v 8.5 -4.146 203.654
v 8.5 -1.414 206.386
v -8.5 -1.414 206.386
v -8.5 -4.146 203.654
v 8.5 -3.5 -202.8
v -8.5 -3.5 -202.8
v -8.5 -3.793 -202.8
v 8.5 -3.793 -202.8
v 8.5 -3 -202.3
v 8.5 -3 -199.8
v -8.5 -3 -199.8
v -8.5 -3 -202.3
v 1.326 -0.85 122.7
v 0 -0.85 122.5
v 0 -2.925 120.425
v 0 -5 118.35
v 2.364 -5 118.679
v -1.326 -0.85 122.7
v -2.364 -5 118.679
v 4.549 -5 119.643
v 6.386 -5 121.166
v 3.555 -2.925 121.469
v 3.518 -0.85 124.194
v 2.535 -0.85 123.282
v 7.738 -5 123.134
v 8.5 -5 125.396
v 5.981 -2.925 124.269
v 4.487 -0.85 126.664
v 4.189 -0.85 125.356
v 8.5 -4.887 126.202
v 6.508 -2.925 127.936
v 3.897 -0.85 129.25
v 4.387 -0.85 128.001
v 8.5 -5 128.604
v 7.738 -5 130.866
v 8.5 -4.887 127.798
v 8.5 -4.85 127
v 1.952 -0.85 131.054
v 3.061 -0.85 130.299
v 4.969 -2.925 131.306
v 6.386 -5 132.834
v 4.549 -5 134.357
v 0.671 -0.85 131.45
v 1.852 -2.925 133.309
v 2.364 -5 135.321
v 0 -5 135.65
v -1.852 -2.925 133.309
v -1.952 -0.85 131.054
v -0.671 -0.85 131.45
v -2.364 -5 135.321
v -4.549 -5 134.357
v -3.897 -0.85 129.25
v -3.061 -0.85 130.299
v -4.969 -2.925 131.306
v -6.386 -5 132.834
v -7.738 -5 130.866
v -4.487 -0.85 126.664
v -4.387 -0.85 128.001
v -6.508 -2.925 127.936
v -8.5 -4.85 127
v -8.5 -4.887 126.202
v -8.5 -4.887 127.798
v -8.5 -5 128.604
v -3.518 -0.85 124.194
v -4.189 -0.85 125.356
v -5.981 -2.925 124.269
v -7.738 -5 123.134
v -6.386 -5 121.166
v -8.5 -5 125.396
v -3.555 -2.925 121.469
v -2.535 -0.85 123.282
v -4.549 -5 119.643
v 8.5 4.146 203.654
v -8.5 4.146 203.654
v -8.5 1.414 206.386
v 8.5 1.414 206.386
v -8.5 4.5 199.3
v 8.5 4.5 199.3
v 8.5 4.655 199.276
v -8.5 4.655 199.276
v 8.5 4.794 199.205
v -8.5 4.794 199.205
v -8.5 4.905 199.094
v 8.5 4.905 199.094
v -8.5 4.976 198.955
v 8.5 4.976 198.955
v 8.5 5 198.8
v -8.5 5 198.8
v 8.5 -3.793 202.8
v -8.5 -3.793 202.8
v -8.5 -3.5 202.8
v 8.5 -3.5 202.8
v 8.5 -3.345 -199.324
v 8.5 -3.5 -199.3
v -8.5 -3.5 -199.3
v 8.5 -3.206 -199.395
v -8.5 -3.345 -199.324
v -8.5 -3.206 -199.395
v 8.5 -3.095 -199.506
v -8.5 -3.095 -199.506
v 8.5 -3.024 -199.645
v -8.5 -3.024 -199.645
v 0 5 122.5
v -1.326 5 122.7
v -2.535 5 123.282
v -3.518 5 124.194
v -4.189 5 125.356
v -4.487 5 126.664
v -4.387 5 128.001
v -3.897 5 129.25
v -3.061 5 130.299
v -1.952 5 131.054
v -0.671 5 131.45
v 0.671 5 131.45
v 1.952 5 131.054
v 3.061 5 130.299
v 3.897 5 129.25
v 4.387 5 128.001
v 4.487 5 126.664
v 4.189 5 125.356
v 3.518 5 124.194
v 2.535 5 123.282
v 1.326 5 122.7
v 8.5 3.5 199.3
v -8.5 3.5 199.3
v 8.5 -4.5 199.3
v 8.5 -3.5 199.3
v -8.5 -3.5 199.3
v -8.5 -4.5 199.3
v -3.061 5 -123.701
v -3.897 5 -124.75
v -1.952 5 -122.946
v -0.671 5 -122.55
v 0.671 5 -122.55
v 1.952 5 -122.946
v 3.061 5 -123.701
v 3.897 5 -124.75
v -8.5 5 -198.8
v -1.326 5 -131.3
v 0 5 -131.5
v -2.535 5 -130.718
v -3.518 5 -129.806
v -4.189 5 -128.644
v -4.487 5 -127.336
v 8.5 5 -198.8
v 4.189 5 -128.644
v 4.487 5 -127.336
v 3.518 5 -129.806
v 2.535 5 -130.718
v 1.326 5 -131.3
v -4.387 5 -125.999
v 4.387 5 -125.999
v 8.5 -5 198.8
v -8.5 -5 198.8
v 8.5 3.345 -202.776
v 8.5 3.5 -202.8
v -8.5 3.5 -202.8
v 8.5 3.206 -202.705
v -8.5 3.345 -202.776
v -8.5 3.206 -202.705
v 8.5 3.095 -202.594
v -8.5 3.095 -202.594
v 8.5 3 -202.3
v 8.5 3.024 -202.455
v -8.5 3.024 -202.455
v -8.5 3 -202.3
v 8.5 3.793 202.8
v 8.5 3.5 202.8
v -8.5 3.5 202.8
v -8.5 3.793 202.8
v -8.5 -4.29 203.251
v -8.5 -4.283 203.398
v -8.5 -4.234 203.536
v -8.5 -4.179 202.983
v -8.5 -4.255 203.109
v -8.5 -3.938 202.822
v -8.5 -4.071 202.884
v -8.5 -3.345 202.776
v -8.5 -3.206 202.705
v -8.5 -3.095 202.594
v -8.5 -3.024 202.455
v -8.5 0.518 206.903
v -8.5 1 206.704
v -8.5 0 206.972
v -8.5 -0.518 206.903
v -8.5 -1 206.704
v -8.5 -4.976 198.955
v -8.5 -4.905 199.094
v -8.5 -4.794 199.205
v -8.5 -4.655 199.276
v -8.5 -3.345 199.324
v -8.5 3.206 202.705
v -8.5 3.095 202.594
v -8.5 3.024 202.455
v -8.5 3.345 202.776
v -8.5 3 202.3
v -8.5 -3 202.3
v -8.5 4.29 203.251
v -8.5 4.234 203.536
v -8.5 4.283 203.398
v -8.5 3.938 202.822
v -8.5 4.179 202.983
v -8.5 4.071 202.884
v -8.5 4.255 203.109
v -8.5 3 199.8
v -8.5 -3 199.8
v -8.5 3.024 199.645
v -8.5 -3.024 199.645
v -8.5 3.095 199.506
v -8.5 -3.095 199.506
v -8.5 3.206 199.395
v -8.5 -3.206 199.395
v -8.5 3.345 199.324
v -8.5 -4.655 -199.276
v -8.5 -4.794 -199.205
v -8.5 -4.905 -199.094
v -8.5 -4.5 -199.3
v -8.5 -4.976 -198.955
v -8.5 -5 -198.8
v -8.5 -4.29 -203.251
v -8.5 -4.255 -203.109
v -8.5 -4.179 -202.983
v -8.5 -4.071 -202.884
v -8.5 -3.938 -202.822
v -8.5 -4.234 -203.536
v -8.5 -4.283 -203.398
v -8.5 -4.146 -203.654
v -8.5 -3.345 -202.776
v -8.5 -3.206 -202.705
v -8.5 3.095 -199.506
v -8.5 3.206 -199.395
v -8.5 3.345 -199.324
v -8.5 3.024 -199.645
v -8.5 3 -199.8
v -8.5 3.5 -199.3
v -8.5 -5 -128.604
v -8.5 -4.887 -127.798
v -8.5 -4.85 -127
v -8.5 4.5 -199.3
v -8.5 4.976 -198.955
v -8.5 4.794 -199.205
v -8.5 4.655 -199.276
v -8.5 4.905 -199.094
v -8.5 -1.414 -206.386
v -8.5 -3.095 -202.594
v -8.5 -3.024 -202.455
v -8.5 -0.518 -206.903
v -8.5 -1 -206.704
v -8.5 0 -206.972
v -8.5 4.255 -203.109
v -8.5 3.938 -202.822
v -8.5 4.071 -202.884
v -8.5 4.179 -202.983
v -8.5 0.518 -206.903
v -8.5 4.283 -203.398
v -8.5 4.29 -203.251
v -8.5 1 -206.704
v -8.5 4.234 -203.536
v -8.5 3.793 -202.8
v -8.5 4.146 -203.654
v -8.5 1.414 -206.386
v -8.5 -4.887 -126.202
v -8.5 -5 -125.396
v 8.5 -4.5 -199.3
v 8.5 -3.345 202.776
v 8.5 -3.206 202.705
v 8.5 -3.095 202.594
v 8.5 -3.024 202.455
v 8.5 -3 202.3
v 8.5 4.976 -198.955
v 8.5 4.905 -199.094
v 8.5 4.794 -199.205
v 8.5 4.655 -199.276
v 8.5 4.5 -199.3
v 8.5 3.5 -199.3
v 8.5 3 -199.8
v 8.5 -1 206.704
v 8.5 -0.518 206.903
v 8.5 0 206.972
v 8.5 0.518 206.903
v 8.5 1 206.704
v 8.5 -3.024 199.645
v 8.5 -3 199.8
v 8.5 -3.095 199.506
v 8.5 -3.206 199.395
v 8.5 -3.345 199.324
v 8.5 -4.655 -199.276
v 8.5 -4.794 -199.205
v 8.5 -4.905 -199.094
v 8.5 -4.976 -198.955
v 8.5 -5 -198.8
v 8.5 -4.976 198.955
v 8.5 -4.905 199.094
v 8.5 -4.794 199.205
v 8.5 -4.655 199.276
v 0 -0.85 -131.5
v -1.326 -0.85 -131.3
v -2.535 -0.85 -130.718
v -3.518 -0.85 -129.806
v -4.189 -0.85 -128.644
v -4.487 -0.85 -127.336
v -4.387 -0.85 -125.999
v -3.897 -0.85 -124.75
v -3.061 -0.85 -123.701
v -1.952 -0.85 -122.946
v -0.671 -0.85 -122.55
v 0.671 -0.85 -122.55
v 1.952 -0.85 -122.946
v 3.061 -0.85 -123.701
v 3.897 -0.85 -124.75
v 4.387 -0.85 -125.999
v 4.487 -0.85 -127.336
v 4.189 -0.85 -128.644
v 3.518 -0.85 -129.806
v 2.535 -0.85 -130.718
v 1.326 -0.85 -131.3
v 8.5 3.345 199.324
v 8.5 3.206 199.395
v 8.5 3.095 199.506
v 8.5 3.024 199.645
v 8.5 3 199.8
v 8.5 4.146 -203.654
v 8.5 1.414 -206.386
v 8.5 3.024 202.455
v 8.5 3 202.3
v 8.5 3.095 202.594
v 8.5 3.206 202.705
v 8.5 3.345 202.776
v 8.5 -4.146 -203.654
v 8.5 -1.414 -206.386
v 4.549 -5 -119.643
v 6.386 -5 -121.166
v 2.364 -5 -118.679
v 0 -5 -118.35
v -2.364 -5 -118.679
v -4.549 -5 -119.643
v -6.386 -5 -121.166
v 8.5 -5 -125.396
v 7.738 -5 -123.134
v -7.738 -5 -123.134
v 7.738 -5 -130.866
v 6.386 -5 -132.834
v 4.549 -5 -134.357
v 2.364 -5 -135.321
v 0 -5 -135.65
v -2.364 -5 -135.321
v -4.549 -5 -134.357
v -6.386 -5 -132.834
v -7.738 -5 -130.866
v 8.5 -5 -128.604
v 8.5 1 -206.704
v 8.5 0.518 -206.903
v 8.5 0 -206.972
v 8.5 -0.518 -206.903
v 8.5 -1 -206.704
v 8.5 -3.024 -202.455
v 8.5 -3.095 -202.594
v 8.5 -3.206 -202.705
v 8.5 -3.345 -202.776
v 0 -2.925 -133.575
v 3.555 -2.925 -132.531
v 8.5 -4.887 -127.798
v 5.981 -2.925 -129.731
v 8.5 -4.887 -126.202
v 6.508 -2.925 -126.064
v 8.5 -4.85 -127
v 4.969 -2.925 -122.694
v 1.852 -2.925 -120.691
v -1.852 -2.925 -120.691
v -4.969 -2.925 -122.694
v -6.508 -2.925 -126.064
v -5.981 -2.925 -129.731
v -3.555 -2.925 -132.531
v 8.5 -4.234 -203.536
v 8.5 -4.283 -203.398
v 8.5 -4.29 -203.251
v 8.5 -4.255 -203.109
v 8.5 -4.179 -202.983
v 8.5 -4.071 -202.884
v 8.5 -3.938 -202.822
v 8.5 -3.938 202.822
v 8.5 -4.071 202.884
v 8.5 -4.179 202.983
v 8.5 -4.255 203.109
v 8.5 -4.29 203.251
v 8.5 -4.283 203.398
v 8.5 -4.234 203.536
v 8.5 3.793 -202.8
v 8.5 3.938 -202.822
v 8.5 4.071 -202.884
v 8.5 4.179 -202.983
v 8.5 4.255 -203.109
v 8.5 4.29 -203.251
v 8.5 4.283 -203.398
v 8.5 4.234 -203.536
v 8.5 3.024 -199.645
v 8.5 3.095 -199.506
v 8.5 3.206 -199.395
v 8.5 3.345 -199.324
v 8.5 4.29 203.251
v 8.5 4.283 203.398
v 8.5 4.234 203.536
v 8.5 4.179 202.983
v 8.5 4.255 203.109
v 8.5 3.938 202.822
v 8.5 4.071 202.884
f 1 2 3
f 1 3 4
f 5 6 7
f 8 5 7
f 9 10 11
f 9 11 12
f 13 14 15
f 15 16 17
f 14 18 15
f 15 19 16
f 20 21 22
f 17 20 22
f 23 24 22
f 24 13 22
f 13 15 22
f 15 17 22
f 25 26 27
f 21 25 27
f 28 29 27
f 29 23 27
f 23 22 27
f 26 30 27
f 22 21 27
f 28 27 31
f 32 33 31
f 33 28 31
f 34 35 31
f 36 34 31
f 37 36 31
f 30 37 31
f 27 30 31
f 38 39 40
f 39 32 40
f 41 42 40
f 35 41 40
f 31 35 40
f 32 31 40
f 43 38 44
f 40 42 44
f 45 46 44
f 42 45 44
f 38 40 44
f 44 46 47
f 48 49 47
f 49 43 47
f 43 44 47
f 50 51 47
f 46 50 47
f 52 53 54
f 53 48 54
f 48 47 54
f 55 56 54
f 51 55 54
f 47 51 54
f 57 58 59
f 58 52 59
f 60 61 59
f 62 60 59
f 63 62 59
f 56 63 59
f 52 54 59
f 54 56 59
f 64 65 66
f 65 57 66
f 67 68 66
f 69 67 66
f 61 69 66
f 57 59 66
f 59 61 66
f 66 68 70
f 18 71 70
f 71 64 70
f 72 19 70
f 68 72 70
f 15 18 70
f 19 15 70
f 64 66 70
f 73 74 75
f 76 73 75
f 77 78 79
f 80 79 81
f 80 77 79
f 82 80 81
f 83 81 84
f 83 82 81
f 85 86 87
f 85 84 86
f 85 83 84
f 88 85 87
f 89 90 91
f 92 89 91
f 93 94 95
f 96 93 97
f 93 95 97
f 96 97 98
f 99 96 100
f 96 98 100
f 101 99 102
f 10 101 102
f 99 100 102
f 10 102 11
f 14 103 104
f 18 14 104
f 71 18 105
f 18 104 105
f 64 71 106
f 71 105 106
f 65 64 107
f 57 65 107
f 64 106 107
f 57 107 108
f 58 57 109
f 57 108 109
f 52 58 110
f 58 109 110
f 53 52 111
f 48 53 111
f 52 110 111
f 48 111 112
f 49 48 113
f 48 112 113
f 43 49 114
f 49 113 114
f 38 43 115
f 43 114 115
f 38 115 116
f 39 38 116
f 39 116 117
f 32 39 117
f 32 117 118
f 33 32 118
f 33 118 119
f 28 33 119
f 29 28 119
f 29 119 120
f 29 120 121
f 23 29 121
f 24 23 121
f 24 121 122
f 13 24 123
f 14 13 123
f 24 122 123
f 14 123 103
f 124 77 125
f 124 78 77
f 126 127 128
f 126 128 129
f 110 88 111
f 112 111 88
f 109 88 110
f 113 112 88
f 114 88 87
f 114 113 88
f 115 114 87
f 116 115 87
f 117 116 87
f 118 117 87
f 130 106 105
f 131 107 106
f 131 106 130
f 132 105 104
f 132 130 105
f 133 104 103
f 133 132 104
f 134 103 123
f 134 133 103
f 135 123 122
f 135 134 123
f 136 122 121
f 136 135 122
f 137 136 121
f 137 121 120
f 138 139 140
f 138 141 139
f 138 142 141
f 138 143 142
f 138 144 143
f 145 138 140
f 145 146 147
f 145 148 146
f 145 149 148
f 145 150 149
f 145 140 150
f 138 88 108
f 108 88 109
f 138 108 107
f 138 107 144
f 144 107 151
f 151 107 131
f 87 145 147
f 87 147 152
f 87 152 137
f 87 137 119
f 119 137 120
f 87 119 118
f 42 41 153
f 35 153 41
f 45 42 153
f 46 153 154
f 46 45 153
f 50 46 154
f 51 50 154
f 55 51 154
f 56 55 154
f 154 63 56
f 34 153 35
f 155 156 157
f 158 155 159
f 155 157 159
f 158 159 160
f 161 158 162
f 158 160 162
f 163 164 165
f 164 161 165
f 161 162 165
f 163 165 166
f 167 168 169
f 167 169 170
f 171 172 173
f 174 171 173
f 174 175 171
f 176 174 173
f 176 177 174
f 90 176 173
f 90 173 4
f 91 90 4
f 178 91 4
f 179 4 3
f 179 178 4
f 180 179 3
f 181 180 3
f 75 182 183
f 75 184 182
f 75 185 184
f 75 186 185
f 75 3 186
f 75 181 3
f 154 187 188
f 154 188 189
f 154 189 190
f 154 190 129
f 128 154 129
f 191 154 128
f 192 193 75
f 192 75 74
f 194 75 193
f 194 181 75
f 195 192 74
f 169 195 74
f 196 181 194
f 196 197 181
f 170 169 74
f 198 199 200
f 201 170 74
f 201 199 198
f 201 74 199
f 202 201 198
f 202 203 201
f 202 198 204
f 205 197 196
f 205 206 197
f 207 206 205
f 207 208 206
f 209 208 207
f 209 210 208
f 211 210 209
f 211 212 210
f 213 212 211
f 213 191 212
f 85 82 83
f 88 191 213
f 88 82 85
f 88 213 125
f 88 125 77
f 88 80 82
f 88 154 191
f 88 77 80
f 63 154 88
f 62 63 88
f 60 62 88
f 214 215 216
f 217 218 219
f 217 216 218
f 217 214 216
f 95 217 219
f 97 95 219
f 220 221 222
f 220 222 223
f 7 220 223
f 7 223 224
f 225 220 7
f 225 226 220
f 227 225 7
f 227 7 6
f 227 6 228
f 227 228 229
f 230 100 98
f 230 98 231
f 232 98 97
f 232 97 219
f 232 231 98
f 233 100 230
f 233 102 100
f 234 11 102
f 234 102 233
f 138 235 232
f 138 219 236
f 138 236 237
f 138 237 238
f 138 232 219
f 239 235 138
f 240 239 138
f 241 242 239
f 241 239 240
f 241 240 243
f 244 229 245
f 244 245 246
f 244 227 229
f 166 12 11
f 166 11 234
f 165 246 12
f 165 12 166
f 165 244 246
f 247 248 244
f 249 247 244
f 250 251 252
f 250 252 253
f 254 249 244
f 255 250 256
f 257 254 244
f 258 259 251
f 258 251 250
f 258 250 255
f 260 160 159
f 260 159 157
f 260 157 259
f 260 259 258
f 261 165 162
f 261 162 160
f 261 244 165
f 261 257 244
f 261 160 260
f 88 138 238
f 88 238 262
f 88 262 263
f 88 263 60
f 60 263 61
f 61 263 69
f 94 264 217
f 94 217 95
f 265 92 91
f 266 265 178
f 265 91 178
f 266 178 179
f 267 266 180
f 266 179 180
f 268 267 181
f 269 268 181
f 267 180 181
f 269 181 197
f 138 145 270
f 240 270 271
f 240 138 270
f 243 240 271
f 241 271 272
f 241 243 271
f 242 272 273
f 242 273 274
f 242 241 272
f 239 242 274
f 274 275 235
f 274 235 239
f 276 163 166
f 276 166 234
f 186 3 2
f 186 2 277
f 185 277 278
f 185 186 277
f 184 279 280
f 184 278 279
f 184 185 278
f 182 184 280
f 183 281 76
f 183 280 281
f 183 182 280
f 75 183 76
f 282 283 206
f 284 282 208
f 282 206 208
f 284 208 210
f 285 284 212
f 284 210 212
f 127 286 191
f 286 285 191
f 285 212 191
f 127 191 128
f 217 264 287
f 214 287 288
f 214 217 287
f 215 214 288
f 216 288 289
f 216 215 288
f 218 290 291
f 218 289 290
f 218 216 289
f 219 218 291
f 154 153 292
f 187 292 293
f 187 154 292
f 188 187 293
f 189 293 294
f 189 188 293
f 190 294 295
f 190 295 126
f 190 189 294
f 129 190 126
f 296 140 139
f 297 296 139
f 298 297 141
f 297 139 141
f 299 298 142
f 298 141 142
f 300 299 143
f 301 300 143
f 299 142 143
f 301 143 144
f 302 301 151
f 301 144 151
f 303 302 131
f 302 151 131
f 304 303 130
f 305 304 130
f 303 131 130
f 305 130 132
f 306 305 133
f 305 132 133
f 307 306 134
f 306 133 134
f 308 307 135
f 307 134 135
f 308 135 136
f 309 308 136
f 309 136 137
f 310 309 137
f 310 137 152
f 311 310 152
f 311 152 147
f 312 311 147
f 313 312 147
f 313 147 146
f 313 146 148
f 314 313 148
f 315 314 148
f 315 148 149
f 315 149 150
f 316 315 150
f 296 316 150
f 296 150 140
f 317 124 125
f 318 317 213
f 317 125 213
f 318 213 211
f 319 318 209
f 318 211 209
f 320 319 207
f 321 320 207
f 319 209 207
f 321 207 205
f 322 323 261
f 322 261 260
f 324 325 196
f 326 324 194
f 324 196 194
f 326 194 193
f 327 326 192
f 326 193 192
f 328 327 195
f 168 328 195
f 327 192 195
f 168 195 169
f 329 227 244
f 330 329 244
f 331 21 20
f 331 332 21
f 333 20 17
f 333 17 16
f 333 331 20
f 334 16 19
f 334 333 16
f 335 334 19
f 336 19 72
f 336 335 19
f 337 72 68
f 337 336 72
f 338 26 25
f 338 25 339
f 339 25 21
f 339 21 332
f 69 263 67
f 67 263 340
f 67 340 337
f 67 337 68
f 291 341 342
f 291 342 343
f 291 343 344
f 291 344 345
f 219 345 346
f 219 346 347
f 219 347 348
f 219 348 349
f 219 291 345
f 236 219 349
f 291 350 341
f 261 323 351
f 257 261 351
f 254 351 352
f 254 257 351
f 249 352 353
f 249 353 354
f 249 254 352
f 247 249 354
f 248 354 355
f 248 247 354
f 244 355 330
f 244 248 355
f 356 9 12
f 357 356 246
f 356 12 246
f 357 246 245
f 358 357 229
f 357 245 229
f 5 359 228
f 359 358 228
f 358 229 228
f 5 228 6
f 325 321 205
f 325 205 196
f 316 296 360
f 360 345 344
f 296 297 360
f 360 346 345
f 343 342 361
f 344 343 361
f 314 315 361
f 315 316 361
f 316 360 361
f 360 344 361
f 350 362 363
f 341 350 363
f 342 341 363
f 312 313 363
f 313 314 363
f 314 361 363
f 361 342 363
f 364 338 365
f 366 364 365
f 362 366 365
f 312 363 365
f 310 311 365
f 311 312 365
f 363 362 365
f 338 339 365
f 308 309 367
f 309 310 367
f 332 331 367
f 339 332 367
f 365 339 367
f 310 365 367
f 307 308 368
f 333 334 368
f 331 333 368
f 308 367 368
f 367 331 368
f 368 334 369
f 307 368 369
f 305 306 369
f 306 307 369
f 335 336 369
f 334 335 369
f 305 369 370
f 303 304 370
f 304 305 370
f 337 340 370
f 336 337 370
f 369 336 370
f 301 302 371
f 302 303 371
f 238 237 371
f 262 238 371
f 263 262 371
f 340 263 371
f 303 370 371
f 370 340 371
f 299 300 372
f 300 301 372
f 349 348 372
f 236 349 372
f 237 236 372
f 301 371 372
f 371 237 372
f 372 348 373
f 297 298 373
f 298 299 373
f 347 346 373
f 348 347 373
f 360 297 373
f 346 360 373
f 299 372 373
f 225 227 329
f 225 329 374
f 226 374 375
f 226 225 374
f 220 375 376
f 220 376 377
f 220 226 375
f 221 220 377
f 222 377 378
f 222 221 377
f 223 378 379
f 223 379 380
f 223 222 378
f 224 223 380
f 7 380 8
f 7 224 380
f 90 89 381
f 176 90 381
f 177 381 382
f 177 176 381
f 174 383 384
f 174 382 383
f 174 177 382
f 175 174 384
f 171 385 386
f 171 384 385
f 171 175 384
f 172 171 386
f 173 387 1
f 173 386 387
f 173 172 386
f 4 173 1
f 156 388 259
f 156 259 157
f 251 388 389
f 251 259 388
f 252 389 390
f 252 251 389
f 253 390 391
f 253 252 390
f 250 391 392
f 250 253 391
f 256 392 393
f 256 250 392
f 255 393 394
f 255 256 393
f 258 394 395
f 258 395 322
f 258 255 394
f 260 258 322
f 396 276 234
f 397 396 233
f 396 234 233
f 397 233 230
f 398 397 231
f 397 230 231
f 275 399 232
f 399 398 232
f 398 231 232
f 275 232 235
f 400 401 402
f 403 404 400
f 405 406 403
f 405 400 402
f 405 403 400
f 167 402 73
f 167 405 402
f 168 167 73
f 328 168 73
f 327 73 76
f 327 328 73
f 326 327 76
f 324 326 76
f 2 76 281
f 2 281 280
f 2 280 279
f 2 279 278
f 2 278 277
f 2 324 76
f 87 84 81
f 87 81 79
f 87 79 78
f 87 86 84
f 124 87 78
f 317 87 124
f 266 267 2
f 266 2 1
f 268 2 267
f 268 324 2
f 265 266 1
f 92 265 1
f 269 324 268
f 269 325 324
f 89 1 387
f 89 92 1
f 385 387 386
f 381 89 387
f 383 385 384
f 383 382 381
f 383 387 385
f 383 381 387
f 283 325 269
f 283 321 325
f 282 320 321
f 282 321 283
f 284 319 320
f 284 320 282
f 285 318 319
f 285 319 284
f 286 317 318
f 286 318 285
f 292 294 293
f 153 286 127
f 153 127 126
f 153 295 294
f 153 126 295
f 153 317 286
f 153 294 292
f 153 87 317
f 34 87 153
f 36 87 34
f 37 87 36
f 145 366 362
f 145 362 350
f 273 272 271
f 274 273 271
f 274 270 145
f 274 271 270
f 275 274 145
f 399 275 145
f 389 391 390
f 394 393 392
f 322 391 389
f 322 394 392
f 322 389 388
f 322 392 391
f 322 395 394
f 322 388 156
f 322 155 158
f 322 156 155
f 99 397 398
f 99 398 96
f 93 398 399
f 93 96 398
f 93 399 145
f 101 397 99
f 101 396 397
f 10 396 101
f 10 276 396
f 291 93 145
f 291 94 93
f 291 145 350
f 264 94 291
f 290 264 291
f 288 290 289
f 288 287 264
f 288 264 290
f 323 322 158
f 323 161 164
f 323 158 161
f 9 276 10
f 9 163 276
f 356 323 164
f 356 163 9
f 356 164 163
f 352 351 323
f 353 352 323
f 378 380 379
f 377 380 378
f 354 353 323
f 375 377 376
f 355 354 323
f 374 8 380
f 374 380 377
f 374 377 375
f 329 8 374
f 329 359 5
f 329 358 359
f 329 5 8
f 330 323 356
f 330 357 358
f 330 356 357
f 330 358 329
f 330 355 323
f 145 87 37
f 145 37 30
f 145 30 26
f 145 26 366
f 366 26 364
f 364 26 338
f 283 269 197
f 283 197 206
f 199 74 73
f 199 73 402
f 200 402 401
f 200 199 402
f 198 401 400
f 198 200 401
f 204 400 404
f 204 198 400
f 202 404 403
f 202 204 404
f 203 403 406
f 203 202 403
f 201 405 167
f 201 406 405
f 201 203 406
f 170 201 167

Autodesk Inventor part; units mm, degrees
ref_plane "YZ Plane" through (0, 0, 0) normal (1, 0, 0) x (0, 1, 0)
ref_plane "XZ Plane" through (0, 0, 0) normal (0, 1, 0) x (-1, 0, 0)
ref_plane "XY Plane" through (0, 0, 0) normal (0, 0, 1) x (1, 0, 0)
sketch "Sketch1" plane through (0, 0, 0) normal (0, 0, 1) x (1, 0, 0)
  line L0 (8.5, -5) -> (-8.5, -5)
  line L1 (-8.5, -5) -> (-8.5, 5)
  line L2 (-8.5, 5) -> (8.5, 5)
  line L3 (8.5, 5) -> (8.5, -5)
  line L4 (8.5, -5) -> (-8.5, 5) construction
  line L5 (-8.5, -5) -> (8.5, 5) construction
  point P0 (0, 0)
  dimension "d0" = 17
  dimension "d1" = 10
extrude "Extrusion1" add sketch "Sketch1" along normal blind 207.8
sketch "Sketch2" plane through (8.5, -5, 0) normal (1, 0, 0) x (0, 0, -1)
  line L0 (0, 10) -> (-207.8, 10) projected
  line L1 (-199.3, 10) -> (-199.3, 8)
  line L2 (-199.3, 8) -> (-202.8, 8)
  line L3 (-202.8, 8) -> (-202.8, 10)
  line L4 (-202.8, 10) -> (-207.8, 5)
  line L5 (-207.8, 5) -> (-202.8, 0)
  line L6 (-202.8, 0) -> (-202.8, 2)
  line L7 (-202.8, 2) -> (-199.3, 2)
  line L8 (-199.3, 2) -> (-199.3, 0)
  line L9 (0, 0) -> (-207.8, 0) projected
  line L10 (0, 10) -> (-207.8, 10) projected
  line L11 (-207.8, 0) -> (-207.8, 10) projected
  point P0 (0, 5)
  point P1 (-202.8, 0)
  point P2 (-202.8, 10)
  point P3 (-202.8, 10)
  dimension "d5" = 6
  dimension "d6" = 3.5
  dimension "d7" = 5
extrude "Extrusion2" cut sketch "Sketch2" against normal through all
fillet "Fillet1" radius 0.5 8 edges at (0, 5, 199.3) (0, 3, 199.3) (0, 3, 202.8) (0, 5, 202.8) (0, -5, 202.8) (0, -3, 202.8) (0, -3, 199.3) (0, -5, 199.3)
fillet "Fillet2" radius 2 1 edges at (0, 0, 207.8)
mirror "Mirror2" about plane through (0, 0, 0) normal (0, 0, -1)
sketch "Sketch3" plane through (-8.5, -5, 198.8) normal (0, 1, 0) x (1, 0, 0)
  point P0 (8.5, 198.8)
  point P1 (8.5, 71.8)
  point P2 (8.5, 325.8)
  dimension "d12" = 254
  dimension "d13" = 127
hole "Hole1" at (0, -5, 127) at (0, -5, -127) direction (0, 1, 0) diameter 9 end through all countersink diameter 17.3 countersink angle 90 clearance for "Flat Head Machine Screw" size "M8" standard "Ansi Metric M Profile"
equation "\"d13\" = 0.5 * d12"
properties part number "Support Rod" material "Aluminum 6061"
